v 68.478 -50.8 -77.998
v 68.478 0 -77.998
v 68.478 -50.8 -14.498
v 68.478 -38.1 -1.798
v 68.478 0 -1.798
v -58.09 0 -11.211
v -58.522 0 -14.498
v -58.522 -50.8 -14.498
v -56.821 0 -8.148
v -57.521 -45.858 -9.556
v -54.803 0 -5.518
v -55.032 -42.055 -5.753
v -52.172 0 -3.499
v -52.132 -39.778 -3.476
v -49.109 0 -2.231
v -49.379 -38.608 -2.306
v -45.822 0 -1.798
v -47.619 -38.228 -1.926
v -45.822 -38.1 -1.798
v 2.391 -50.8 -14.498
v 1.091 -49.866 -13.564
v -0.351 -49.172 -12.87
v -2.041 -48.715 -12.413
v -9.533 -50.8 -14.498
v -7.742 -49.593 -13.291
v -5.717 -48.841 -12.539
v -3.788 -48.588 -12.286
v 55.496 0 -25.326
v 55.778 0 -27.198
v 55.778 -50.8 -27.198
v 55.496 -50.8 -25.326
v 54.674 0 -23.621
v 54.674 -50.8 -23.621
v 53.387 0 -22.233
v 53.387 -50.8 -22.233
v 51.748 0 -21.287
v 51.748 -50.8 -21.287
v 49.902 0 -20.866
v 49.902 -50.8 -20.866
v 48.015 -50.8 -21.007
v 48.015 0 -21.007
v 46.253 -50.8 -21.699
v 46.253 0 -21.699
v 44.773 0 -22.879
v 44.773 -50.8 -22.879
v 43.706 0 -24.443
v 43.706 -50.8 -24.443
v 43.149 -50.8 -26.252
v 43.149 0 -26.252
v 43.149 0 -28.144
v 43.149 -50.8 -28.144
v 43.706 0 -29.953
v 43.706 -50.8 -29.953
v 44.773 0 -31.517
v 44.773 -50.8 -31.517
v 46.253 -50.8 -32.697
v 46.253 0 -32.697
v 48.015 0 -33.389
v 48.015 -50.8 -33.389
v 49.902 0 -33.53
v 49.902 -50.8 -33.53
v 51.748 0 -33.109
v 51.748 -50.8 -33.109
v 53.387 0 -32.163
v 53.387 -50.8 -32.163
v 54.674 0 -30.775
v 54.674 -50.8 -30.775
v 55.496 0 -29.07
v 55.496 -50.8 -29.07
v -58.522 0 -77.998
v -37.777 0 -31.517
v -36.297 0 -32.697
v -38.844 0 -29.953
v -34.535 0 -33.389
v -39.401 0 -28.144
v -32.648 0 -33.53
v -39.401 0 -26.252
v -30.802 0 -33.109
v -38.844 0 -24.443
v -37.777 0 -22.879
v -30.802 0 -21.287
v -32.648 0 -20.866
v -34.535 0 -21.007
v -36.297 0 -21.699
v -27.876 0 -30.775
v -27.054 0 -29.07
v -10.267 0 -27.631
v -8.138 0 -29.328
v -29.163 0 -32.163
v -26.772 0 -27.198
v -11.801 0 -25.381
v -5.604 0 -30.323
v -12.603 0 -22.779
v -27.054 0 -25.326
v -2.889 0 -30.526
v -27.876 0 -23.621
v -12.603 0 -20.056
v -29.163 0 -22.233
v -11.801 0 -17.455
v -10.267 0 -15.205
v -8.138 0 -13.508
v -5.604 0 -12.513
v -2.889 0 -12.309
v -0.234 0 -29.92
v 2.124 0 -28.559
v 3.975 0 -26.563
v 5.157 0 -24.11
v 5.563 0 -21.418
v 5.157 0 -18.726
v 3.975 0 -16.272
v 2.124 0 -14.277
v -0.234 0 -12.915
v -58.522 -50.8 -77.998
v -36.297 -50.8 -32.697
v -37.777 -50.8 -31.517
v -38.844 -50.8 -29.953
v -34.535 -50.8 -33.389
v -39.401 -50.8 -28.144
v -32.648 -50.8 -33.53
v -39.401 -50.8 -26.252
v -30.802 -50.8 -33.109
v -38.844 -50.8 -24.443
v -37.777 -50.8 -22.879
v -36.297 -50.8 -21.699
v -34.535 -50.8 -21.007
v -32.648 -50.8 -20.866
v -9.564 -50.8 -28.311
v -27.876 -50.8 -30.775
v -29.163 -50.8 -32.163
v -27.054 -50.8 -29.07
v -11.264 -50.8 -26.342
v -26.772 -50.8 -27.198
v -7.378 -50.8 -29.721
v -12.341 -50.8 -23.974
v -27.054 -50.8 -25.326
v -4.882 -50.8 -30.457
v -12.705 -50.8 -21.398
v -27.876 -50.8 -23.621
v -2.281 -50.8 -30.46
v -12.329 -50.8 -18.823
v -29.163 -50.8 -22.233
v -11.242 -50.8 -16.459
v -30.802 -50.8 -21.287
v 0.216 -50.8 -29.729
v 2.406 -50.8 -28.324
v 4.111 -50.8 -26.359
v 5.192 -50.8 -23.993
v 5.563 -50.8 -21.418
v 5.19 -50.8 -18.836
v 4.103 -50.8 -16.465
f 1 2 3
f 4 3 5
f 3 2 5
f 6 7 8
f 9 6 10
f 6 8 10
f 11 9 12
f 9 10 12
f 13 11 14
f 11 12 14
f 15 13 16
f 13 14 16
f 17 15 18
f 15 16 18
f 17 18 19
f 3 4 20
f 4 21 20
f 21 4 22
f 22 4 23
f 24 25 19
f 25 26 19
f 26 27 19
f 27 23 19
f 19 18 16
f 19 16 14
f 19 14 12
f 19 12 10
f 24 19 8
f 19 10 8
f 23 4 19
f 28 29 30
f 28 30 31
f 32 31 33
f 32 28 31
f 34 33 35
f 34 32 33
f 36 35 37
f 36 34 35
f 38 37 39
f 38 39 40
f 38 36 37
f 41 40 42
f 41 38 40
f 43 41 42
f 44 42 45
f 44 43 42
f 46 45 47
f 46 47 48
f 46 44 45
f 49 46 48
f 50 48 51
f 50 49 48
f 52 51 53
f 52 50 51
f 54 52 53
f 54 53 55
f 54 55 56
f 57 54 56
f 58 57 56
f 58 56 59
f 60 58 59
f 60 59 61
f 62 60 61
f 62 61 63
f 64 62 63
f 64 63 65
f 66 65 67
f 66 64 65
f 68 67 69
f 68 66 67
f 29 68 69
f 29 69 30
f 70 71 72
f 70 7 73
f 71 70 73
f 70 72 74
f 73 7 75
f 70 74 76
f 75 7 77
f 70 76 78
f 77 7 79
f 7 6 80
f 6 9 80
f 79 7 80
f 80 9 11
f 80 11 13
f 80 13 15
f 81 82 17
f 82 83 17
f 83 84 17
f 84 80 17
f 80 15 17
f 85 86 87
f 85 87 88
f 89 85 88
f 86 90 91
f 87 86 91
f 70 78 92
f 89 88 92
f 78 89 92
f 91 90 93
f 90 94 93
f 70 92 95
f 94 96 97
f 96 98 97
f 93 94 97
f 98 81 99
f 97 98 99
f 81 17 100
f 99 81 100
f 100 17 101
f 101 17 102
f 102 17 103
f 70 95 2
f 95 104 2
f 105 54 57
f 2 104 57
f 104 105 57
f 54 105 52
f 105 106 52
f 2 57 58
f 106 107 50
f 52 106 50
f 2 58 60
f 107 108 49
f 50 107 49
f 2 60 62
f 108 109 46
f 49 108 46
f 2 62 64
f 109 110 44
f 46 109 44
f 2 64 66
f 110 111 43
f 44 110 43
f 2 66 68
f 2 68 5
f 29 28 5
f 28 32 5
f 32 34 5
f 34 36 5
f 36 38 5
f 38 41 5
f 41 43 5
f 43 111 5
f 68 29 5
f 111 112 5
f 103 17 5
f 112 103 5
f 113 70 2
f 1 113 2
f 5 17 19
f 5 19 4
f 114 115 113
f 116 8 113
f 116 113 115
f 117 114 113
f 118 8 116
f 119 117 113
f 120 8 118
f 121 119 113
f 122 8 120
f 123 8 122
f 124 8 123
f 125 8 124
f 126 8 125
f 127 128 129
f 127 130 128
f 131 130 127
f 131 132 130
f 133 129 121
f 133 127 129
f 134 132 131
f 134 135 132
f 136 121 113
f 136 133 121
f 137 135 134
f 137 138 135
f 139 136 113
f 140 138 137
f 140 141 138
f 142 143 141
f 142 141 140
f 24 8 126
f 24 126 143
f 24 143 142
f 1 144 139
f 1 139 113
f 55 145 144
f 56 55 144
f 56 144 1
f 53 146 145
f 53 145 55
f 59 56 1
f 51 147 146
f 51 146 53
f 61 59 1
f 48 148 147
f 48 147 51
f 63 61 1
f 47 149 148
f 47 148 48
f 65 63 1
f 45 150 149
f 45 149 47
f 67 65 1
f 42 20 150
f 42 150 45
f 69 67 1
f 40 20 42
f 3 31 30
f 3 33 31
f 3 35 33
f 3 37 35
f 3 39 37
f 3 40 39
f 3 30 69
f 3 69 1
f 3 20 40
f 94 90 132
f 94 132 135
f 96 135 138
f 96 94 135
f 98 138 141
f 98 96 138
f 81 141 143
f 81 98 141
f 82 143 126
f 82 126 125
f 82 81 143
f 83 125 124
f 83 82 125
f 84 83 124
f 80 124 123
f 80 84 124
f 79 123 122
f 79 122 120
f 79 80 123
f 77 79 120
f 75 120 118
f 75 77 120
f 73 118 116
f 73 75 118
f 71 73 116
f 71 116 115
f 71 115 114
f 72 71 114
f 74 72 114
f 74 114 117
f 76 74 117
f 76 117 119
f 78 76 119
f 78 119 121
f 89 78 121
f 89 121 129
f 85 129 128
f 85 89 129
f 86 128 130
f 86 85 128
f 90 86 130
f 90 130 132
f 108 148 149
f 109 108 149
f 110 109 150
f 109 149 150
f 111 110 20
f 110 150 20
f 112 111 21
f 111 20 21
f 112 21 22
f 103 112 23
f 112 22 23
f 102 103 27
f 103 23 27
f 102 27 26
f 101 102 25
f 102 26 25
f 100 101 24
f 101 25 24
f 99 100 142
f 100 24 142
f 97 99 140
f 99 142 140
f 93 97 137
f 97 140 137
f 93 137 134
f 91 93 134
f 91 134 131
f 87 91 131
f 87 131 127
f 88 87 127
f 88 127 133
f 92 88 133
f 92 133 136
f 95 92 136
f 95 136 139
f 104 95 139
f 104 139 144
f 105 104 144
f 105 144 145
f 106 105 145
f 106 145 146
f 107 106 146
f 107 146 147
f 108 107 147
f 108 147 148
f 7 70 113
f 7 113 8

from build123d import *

# Parameters (mm, degrees)
F0_W        = 127
F0_H        = 76.2
F0_R        = 6.35
F1_DEPTH    = 50.8
F2_R        = 9.1340050973
F3_DEPTH    = 70.104
F4_T1_DEPTH = 192.3207478943
F5_R        = 12.7


# Not quite as in the source:
# - a fillet or chamfer that OpenCascade refuses, or shapes differently, is made with other operations: its cross-section is extruded or revolved along the edge and cut away or added


with BuildPart() as f1:
    # F0 (on Front) → F1 (new body)
    with BuildSketch(Plane.XZ):
        with Locations((4.9776248634, -39.8979571181)):
            Rectangle(F0_W, F0_H)
        with Locations((-33.1223751366, -27.1979571181)):
            Circle(F0_R, mode=Mode.SUBTRACT)
        with Locations((49.4276248634, -27.1979571181)):
            Circle(F0_R, mode=Mode.SUBTRACT)
    extrude(amount=F1_DEPTH)

    # F2 (on face) → F3 (cut)
    with BuildSketch(Plane.XZ.offset(50.8)):
        with Locations((-3.571436042, -21.4178189635)):
            Circle(F2_R)
    extrude(amount=-F3_DEPTH, mode=Mode.SUBTRACT)

    # F4: chamfer of 12.7 on 1 edges, made by hand

    # F4_s2 → F4_t1 (cut)
    with BuildSketch(Plane.YZ.offset(-91.1827490838)):
        Polygon((-38.1, -1.7979571181), (-50.8, -14.4979571181), (-50.8, -1.7979571181), align=None)
    extrude(amount=F4_T1_DEPTH, mode=Mode.SUBTRACT)

    # F5
    f5_edges = [f1.edges().sort_by_distance(p)[0] for p in [
        (-58.522375, -19.05, -1.797957),
    ]]
    fillet(f5_edges, radius=F5_R)


solid = f1.part
